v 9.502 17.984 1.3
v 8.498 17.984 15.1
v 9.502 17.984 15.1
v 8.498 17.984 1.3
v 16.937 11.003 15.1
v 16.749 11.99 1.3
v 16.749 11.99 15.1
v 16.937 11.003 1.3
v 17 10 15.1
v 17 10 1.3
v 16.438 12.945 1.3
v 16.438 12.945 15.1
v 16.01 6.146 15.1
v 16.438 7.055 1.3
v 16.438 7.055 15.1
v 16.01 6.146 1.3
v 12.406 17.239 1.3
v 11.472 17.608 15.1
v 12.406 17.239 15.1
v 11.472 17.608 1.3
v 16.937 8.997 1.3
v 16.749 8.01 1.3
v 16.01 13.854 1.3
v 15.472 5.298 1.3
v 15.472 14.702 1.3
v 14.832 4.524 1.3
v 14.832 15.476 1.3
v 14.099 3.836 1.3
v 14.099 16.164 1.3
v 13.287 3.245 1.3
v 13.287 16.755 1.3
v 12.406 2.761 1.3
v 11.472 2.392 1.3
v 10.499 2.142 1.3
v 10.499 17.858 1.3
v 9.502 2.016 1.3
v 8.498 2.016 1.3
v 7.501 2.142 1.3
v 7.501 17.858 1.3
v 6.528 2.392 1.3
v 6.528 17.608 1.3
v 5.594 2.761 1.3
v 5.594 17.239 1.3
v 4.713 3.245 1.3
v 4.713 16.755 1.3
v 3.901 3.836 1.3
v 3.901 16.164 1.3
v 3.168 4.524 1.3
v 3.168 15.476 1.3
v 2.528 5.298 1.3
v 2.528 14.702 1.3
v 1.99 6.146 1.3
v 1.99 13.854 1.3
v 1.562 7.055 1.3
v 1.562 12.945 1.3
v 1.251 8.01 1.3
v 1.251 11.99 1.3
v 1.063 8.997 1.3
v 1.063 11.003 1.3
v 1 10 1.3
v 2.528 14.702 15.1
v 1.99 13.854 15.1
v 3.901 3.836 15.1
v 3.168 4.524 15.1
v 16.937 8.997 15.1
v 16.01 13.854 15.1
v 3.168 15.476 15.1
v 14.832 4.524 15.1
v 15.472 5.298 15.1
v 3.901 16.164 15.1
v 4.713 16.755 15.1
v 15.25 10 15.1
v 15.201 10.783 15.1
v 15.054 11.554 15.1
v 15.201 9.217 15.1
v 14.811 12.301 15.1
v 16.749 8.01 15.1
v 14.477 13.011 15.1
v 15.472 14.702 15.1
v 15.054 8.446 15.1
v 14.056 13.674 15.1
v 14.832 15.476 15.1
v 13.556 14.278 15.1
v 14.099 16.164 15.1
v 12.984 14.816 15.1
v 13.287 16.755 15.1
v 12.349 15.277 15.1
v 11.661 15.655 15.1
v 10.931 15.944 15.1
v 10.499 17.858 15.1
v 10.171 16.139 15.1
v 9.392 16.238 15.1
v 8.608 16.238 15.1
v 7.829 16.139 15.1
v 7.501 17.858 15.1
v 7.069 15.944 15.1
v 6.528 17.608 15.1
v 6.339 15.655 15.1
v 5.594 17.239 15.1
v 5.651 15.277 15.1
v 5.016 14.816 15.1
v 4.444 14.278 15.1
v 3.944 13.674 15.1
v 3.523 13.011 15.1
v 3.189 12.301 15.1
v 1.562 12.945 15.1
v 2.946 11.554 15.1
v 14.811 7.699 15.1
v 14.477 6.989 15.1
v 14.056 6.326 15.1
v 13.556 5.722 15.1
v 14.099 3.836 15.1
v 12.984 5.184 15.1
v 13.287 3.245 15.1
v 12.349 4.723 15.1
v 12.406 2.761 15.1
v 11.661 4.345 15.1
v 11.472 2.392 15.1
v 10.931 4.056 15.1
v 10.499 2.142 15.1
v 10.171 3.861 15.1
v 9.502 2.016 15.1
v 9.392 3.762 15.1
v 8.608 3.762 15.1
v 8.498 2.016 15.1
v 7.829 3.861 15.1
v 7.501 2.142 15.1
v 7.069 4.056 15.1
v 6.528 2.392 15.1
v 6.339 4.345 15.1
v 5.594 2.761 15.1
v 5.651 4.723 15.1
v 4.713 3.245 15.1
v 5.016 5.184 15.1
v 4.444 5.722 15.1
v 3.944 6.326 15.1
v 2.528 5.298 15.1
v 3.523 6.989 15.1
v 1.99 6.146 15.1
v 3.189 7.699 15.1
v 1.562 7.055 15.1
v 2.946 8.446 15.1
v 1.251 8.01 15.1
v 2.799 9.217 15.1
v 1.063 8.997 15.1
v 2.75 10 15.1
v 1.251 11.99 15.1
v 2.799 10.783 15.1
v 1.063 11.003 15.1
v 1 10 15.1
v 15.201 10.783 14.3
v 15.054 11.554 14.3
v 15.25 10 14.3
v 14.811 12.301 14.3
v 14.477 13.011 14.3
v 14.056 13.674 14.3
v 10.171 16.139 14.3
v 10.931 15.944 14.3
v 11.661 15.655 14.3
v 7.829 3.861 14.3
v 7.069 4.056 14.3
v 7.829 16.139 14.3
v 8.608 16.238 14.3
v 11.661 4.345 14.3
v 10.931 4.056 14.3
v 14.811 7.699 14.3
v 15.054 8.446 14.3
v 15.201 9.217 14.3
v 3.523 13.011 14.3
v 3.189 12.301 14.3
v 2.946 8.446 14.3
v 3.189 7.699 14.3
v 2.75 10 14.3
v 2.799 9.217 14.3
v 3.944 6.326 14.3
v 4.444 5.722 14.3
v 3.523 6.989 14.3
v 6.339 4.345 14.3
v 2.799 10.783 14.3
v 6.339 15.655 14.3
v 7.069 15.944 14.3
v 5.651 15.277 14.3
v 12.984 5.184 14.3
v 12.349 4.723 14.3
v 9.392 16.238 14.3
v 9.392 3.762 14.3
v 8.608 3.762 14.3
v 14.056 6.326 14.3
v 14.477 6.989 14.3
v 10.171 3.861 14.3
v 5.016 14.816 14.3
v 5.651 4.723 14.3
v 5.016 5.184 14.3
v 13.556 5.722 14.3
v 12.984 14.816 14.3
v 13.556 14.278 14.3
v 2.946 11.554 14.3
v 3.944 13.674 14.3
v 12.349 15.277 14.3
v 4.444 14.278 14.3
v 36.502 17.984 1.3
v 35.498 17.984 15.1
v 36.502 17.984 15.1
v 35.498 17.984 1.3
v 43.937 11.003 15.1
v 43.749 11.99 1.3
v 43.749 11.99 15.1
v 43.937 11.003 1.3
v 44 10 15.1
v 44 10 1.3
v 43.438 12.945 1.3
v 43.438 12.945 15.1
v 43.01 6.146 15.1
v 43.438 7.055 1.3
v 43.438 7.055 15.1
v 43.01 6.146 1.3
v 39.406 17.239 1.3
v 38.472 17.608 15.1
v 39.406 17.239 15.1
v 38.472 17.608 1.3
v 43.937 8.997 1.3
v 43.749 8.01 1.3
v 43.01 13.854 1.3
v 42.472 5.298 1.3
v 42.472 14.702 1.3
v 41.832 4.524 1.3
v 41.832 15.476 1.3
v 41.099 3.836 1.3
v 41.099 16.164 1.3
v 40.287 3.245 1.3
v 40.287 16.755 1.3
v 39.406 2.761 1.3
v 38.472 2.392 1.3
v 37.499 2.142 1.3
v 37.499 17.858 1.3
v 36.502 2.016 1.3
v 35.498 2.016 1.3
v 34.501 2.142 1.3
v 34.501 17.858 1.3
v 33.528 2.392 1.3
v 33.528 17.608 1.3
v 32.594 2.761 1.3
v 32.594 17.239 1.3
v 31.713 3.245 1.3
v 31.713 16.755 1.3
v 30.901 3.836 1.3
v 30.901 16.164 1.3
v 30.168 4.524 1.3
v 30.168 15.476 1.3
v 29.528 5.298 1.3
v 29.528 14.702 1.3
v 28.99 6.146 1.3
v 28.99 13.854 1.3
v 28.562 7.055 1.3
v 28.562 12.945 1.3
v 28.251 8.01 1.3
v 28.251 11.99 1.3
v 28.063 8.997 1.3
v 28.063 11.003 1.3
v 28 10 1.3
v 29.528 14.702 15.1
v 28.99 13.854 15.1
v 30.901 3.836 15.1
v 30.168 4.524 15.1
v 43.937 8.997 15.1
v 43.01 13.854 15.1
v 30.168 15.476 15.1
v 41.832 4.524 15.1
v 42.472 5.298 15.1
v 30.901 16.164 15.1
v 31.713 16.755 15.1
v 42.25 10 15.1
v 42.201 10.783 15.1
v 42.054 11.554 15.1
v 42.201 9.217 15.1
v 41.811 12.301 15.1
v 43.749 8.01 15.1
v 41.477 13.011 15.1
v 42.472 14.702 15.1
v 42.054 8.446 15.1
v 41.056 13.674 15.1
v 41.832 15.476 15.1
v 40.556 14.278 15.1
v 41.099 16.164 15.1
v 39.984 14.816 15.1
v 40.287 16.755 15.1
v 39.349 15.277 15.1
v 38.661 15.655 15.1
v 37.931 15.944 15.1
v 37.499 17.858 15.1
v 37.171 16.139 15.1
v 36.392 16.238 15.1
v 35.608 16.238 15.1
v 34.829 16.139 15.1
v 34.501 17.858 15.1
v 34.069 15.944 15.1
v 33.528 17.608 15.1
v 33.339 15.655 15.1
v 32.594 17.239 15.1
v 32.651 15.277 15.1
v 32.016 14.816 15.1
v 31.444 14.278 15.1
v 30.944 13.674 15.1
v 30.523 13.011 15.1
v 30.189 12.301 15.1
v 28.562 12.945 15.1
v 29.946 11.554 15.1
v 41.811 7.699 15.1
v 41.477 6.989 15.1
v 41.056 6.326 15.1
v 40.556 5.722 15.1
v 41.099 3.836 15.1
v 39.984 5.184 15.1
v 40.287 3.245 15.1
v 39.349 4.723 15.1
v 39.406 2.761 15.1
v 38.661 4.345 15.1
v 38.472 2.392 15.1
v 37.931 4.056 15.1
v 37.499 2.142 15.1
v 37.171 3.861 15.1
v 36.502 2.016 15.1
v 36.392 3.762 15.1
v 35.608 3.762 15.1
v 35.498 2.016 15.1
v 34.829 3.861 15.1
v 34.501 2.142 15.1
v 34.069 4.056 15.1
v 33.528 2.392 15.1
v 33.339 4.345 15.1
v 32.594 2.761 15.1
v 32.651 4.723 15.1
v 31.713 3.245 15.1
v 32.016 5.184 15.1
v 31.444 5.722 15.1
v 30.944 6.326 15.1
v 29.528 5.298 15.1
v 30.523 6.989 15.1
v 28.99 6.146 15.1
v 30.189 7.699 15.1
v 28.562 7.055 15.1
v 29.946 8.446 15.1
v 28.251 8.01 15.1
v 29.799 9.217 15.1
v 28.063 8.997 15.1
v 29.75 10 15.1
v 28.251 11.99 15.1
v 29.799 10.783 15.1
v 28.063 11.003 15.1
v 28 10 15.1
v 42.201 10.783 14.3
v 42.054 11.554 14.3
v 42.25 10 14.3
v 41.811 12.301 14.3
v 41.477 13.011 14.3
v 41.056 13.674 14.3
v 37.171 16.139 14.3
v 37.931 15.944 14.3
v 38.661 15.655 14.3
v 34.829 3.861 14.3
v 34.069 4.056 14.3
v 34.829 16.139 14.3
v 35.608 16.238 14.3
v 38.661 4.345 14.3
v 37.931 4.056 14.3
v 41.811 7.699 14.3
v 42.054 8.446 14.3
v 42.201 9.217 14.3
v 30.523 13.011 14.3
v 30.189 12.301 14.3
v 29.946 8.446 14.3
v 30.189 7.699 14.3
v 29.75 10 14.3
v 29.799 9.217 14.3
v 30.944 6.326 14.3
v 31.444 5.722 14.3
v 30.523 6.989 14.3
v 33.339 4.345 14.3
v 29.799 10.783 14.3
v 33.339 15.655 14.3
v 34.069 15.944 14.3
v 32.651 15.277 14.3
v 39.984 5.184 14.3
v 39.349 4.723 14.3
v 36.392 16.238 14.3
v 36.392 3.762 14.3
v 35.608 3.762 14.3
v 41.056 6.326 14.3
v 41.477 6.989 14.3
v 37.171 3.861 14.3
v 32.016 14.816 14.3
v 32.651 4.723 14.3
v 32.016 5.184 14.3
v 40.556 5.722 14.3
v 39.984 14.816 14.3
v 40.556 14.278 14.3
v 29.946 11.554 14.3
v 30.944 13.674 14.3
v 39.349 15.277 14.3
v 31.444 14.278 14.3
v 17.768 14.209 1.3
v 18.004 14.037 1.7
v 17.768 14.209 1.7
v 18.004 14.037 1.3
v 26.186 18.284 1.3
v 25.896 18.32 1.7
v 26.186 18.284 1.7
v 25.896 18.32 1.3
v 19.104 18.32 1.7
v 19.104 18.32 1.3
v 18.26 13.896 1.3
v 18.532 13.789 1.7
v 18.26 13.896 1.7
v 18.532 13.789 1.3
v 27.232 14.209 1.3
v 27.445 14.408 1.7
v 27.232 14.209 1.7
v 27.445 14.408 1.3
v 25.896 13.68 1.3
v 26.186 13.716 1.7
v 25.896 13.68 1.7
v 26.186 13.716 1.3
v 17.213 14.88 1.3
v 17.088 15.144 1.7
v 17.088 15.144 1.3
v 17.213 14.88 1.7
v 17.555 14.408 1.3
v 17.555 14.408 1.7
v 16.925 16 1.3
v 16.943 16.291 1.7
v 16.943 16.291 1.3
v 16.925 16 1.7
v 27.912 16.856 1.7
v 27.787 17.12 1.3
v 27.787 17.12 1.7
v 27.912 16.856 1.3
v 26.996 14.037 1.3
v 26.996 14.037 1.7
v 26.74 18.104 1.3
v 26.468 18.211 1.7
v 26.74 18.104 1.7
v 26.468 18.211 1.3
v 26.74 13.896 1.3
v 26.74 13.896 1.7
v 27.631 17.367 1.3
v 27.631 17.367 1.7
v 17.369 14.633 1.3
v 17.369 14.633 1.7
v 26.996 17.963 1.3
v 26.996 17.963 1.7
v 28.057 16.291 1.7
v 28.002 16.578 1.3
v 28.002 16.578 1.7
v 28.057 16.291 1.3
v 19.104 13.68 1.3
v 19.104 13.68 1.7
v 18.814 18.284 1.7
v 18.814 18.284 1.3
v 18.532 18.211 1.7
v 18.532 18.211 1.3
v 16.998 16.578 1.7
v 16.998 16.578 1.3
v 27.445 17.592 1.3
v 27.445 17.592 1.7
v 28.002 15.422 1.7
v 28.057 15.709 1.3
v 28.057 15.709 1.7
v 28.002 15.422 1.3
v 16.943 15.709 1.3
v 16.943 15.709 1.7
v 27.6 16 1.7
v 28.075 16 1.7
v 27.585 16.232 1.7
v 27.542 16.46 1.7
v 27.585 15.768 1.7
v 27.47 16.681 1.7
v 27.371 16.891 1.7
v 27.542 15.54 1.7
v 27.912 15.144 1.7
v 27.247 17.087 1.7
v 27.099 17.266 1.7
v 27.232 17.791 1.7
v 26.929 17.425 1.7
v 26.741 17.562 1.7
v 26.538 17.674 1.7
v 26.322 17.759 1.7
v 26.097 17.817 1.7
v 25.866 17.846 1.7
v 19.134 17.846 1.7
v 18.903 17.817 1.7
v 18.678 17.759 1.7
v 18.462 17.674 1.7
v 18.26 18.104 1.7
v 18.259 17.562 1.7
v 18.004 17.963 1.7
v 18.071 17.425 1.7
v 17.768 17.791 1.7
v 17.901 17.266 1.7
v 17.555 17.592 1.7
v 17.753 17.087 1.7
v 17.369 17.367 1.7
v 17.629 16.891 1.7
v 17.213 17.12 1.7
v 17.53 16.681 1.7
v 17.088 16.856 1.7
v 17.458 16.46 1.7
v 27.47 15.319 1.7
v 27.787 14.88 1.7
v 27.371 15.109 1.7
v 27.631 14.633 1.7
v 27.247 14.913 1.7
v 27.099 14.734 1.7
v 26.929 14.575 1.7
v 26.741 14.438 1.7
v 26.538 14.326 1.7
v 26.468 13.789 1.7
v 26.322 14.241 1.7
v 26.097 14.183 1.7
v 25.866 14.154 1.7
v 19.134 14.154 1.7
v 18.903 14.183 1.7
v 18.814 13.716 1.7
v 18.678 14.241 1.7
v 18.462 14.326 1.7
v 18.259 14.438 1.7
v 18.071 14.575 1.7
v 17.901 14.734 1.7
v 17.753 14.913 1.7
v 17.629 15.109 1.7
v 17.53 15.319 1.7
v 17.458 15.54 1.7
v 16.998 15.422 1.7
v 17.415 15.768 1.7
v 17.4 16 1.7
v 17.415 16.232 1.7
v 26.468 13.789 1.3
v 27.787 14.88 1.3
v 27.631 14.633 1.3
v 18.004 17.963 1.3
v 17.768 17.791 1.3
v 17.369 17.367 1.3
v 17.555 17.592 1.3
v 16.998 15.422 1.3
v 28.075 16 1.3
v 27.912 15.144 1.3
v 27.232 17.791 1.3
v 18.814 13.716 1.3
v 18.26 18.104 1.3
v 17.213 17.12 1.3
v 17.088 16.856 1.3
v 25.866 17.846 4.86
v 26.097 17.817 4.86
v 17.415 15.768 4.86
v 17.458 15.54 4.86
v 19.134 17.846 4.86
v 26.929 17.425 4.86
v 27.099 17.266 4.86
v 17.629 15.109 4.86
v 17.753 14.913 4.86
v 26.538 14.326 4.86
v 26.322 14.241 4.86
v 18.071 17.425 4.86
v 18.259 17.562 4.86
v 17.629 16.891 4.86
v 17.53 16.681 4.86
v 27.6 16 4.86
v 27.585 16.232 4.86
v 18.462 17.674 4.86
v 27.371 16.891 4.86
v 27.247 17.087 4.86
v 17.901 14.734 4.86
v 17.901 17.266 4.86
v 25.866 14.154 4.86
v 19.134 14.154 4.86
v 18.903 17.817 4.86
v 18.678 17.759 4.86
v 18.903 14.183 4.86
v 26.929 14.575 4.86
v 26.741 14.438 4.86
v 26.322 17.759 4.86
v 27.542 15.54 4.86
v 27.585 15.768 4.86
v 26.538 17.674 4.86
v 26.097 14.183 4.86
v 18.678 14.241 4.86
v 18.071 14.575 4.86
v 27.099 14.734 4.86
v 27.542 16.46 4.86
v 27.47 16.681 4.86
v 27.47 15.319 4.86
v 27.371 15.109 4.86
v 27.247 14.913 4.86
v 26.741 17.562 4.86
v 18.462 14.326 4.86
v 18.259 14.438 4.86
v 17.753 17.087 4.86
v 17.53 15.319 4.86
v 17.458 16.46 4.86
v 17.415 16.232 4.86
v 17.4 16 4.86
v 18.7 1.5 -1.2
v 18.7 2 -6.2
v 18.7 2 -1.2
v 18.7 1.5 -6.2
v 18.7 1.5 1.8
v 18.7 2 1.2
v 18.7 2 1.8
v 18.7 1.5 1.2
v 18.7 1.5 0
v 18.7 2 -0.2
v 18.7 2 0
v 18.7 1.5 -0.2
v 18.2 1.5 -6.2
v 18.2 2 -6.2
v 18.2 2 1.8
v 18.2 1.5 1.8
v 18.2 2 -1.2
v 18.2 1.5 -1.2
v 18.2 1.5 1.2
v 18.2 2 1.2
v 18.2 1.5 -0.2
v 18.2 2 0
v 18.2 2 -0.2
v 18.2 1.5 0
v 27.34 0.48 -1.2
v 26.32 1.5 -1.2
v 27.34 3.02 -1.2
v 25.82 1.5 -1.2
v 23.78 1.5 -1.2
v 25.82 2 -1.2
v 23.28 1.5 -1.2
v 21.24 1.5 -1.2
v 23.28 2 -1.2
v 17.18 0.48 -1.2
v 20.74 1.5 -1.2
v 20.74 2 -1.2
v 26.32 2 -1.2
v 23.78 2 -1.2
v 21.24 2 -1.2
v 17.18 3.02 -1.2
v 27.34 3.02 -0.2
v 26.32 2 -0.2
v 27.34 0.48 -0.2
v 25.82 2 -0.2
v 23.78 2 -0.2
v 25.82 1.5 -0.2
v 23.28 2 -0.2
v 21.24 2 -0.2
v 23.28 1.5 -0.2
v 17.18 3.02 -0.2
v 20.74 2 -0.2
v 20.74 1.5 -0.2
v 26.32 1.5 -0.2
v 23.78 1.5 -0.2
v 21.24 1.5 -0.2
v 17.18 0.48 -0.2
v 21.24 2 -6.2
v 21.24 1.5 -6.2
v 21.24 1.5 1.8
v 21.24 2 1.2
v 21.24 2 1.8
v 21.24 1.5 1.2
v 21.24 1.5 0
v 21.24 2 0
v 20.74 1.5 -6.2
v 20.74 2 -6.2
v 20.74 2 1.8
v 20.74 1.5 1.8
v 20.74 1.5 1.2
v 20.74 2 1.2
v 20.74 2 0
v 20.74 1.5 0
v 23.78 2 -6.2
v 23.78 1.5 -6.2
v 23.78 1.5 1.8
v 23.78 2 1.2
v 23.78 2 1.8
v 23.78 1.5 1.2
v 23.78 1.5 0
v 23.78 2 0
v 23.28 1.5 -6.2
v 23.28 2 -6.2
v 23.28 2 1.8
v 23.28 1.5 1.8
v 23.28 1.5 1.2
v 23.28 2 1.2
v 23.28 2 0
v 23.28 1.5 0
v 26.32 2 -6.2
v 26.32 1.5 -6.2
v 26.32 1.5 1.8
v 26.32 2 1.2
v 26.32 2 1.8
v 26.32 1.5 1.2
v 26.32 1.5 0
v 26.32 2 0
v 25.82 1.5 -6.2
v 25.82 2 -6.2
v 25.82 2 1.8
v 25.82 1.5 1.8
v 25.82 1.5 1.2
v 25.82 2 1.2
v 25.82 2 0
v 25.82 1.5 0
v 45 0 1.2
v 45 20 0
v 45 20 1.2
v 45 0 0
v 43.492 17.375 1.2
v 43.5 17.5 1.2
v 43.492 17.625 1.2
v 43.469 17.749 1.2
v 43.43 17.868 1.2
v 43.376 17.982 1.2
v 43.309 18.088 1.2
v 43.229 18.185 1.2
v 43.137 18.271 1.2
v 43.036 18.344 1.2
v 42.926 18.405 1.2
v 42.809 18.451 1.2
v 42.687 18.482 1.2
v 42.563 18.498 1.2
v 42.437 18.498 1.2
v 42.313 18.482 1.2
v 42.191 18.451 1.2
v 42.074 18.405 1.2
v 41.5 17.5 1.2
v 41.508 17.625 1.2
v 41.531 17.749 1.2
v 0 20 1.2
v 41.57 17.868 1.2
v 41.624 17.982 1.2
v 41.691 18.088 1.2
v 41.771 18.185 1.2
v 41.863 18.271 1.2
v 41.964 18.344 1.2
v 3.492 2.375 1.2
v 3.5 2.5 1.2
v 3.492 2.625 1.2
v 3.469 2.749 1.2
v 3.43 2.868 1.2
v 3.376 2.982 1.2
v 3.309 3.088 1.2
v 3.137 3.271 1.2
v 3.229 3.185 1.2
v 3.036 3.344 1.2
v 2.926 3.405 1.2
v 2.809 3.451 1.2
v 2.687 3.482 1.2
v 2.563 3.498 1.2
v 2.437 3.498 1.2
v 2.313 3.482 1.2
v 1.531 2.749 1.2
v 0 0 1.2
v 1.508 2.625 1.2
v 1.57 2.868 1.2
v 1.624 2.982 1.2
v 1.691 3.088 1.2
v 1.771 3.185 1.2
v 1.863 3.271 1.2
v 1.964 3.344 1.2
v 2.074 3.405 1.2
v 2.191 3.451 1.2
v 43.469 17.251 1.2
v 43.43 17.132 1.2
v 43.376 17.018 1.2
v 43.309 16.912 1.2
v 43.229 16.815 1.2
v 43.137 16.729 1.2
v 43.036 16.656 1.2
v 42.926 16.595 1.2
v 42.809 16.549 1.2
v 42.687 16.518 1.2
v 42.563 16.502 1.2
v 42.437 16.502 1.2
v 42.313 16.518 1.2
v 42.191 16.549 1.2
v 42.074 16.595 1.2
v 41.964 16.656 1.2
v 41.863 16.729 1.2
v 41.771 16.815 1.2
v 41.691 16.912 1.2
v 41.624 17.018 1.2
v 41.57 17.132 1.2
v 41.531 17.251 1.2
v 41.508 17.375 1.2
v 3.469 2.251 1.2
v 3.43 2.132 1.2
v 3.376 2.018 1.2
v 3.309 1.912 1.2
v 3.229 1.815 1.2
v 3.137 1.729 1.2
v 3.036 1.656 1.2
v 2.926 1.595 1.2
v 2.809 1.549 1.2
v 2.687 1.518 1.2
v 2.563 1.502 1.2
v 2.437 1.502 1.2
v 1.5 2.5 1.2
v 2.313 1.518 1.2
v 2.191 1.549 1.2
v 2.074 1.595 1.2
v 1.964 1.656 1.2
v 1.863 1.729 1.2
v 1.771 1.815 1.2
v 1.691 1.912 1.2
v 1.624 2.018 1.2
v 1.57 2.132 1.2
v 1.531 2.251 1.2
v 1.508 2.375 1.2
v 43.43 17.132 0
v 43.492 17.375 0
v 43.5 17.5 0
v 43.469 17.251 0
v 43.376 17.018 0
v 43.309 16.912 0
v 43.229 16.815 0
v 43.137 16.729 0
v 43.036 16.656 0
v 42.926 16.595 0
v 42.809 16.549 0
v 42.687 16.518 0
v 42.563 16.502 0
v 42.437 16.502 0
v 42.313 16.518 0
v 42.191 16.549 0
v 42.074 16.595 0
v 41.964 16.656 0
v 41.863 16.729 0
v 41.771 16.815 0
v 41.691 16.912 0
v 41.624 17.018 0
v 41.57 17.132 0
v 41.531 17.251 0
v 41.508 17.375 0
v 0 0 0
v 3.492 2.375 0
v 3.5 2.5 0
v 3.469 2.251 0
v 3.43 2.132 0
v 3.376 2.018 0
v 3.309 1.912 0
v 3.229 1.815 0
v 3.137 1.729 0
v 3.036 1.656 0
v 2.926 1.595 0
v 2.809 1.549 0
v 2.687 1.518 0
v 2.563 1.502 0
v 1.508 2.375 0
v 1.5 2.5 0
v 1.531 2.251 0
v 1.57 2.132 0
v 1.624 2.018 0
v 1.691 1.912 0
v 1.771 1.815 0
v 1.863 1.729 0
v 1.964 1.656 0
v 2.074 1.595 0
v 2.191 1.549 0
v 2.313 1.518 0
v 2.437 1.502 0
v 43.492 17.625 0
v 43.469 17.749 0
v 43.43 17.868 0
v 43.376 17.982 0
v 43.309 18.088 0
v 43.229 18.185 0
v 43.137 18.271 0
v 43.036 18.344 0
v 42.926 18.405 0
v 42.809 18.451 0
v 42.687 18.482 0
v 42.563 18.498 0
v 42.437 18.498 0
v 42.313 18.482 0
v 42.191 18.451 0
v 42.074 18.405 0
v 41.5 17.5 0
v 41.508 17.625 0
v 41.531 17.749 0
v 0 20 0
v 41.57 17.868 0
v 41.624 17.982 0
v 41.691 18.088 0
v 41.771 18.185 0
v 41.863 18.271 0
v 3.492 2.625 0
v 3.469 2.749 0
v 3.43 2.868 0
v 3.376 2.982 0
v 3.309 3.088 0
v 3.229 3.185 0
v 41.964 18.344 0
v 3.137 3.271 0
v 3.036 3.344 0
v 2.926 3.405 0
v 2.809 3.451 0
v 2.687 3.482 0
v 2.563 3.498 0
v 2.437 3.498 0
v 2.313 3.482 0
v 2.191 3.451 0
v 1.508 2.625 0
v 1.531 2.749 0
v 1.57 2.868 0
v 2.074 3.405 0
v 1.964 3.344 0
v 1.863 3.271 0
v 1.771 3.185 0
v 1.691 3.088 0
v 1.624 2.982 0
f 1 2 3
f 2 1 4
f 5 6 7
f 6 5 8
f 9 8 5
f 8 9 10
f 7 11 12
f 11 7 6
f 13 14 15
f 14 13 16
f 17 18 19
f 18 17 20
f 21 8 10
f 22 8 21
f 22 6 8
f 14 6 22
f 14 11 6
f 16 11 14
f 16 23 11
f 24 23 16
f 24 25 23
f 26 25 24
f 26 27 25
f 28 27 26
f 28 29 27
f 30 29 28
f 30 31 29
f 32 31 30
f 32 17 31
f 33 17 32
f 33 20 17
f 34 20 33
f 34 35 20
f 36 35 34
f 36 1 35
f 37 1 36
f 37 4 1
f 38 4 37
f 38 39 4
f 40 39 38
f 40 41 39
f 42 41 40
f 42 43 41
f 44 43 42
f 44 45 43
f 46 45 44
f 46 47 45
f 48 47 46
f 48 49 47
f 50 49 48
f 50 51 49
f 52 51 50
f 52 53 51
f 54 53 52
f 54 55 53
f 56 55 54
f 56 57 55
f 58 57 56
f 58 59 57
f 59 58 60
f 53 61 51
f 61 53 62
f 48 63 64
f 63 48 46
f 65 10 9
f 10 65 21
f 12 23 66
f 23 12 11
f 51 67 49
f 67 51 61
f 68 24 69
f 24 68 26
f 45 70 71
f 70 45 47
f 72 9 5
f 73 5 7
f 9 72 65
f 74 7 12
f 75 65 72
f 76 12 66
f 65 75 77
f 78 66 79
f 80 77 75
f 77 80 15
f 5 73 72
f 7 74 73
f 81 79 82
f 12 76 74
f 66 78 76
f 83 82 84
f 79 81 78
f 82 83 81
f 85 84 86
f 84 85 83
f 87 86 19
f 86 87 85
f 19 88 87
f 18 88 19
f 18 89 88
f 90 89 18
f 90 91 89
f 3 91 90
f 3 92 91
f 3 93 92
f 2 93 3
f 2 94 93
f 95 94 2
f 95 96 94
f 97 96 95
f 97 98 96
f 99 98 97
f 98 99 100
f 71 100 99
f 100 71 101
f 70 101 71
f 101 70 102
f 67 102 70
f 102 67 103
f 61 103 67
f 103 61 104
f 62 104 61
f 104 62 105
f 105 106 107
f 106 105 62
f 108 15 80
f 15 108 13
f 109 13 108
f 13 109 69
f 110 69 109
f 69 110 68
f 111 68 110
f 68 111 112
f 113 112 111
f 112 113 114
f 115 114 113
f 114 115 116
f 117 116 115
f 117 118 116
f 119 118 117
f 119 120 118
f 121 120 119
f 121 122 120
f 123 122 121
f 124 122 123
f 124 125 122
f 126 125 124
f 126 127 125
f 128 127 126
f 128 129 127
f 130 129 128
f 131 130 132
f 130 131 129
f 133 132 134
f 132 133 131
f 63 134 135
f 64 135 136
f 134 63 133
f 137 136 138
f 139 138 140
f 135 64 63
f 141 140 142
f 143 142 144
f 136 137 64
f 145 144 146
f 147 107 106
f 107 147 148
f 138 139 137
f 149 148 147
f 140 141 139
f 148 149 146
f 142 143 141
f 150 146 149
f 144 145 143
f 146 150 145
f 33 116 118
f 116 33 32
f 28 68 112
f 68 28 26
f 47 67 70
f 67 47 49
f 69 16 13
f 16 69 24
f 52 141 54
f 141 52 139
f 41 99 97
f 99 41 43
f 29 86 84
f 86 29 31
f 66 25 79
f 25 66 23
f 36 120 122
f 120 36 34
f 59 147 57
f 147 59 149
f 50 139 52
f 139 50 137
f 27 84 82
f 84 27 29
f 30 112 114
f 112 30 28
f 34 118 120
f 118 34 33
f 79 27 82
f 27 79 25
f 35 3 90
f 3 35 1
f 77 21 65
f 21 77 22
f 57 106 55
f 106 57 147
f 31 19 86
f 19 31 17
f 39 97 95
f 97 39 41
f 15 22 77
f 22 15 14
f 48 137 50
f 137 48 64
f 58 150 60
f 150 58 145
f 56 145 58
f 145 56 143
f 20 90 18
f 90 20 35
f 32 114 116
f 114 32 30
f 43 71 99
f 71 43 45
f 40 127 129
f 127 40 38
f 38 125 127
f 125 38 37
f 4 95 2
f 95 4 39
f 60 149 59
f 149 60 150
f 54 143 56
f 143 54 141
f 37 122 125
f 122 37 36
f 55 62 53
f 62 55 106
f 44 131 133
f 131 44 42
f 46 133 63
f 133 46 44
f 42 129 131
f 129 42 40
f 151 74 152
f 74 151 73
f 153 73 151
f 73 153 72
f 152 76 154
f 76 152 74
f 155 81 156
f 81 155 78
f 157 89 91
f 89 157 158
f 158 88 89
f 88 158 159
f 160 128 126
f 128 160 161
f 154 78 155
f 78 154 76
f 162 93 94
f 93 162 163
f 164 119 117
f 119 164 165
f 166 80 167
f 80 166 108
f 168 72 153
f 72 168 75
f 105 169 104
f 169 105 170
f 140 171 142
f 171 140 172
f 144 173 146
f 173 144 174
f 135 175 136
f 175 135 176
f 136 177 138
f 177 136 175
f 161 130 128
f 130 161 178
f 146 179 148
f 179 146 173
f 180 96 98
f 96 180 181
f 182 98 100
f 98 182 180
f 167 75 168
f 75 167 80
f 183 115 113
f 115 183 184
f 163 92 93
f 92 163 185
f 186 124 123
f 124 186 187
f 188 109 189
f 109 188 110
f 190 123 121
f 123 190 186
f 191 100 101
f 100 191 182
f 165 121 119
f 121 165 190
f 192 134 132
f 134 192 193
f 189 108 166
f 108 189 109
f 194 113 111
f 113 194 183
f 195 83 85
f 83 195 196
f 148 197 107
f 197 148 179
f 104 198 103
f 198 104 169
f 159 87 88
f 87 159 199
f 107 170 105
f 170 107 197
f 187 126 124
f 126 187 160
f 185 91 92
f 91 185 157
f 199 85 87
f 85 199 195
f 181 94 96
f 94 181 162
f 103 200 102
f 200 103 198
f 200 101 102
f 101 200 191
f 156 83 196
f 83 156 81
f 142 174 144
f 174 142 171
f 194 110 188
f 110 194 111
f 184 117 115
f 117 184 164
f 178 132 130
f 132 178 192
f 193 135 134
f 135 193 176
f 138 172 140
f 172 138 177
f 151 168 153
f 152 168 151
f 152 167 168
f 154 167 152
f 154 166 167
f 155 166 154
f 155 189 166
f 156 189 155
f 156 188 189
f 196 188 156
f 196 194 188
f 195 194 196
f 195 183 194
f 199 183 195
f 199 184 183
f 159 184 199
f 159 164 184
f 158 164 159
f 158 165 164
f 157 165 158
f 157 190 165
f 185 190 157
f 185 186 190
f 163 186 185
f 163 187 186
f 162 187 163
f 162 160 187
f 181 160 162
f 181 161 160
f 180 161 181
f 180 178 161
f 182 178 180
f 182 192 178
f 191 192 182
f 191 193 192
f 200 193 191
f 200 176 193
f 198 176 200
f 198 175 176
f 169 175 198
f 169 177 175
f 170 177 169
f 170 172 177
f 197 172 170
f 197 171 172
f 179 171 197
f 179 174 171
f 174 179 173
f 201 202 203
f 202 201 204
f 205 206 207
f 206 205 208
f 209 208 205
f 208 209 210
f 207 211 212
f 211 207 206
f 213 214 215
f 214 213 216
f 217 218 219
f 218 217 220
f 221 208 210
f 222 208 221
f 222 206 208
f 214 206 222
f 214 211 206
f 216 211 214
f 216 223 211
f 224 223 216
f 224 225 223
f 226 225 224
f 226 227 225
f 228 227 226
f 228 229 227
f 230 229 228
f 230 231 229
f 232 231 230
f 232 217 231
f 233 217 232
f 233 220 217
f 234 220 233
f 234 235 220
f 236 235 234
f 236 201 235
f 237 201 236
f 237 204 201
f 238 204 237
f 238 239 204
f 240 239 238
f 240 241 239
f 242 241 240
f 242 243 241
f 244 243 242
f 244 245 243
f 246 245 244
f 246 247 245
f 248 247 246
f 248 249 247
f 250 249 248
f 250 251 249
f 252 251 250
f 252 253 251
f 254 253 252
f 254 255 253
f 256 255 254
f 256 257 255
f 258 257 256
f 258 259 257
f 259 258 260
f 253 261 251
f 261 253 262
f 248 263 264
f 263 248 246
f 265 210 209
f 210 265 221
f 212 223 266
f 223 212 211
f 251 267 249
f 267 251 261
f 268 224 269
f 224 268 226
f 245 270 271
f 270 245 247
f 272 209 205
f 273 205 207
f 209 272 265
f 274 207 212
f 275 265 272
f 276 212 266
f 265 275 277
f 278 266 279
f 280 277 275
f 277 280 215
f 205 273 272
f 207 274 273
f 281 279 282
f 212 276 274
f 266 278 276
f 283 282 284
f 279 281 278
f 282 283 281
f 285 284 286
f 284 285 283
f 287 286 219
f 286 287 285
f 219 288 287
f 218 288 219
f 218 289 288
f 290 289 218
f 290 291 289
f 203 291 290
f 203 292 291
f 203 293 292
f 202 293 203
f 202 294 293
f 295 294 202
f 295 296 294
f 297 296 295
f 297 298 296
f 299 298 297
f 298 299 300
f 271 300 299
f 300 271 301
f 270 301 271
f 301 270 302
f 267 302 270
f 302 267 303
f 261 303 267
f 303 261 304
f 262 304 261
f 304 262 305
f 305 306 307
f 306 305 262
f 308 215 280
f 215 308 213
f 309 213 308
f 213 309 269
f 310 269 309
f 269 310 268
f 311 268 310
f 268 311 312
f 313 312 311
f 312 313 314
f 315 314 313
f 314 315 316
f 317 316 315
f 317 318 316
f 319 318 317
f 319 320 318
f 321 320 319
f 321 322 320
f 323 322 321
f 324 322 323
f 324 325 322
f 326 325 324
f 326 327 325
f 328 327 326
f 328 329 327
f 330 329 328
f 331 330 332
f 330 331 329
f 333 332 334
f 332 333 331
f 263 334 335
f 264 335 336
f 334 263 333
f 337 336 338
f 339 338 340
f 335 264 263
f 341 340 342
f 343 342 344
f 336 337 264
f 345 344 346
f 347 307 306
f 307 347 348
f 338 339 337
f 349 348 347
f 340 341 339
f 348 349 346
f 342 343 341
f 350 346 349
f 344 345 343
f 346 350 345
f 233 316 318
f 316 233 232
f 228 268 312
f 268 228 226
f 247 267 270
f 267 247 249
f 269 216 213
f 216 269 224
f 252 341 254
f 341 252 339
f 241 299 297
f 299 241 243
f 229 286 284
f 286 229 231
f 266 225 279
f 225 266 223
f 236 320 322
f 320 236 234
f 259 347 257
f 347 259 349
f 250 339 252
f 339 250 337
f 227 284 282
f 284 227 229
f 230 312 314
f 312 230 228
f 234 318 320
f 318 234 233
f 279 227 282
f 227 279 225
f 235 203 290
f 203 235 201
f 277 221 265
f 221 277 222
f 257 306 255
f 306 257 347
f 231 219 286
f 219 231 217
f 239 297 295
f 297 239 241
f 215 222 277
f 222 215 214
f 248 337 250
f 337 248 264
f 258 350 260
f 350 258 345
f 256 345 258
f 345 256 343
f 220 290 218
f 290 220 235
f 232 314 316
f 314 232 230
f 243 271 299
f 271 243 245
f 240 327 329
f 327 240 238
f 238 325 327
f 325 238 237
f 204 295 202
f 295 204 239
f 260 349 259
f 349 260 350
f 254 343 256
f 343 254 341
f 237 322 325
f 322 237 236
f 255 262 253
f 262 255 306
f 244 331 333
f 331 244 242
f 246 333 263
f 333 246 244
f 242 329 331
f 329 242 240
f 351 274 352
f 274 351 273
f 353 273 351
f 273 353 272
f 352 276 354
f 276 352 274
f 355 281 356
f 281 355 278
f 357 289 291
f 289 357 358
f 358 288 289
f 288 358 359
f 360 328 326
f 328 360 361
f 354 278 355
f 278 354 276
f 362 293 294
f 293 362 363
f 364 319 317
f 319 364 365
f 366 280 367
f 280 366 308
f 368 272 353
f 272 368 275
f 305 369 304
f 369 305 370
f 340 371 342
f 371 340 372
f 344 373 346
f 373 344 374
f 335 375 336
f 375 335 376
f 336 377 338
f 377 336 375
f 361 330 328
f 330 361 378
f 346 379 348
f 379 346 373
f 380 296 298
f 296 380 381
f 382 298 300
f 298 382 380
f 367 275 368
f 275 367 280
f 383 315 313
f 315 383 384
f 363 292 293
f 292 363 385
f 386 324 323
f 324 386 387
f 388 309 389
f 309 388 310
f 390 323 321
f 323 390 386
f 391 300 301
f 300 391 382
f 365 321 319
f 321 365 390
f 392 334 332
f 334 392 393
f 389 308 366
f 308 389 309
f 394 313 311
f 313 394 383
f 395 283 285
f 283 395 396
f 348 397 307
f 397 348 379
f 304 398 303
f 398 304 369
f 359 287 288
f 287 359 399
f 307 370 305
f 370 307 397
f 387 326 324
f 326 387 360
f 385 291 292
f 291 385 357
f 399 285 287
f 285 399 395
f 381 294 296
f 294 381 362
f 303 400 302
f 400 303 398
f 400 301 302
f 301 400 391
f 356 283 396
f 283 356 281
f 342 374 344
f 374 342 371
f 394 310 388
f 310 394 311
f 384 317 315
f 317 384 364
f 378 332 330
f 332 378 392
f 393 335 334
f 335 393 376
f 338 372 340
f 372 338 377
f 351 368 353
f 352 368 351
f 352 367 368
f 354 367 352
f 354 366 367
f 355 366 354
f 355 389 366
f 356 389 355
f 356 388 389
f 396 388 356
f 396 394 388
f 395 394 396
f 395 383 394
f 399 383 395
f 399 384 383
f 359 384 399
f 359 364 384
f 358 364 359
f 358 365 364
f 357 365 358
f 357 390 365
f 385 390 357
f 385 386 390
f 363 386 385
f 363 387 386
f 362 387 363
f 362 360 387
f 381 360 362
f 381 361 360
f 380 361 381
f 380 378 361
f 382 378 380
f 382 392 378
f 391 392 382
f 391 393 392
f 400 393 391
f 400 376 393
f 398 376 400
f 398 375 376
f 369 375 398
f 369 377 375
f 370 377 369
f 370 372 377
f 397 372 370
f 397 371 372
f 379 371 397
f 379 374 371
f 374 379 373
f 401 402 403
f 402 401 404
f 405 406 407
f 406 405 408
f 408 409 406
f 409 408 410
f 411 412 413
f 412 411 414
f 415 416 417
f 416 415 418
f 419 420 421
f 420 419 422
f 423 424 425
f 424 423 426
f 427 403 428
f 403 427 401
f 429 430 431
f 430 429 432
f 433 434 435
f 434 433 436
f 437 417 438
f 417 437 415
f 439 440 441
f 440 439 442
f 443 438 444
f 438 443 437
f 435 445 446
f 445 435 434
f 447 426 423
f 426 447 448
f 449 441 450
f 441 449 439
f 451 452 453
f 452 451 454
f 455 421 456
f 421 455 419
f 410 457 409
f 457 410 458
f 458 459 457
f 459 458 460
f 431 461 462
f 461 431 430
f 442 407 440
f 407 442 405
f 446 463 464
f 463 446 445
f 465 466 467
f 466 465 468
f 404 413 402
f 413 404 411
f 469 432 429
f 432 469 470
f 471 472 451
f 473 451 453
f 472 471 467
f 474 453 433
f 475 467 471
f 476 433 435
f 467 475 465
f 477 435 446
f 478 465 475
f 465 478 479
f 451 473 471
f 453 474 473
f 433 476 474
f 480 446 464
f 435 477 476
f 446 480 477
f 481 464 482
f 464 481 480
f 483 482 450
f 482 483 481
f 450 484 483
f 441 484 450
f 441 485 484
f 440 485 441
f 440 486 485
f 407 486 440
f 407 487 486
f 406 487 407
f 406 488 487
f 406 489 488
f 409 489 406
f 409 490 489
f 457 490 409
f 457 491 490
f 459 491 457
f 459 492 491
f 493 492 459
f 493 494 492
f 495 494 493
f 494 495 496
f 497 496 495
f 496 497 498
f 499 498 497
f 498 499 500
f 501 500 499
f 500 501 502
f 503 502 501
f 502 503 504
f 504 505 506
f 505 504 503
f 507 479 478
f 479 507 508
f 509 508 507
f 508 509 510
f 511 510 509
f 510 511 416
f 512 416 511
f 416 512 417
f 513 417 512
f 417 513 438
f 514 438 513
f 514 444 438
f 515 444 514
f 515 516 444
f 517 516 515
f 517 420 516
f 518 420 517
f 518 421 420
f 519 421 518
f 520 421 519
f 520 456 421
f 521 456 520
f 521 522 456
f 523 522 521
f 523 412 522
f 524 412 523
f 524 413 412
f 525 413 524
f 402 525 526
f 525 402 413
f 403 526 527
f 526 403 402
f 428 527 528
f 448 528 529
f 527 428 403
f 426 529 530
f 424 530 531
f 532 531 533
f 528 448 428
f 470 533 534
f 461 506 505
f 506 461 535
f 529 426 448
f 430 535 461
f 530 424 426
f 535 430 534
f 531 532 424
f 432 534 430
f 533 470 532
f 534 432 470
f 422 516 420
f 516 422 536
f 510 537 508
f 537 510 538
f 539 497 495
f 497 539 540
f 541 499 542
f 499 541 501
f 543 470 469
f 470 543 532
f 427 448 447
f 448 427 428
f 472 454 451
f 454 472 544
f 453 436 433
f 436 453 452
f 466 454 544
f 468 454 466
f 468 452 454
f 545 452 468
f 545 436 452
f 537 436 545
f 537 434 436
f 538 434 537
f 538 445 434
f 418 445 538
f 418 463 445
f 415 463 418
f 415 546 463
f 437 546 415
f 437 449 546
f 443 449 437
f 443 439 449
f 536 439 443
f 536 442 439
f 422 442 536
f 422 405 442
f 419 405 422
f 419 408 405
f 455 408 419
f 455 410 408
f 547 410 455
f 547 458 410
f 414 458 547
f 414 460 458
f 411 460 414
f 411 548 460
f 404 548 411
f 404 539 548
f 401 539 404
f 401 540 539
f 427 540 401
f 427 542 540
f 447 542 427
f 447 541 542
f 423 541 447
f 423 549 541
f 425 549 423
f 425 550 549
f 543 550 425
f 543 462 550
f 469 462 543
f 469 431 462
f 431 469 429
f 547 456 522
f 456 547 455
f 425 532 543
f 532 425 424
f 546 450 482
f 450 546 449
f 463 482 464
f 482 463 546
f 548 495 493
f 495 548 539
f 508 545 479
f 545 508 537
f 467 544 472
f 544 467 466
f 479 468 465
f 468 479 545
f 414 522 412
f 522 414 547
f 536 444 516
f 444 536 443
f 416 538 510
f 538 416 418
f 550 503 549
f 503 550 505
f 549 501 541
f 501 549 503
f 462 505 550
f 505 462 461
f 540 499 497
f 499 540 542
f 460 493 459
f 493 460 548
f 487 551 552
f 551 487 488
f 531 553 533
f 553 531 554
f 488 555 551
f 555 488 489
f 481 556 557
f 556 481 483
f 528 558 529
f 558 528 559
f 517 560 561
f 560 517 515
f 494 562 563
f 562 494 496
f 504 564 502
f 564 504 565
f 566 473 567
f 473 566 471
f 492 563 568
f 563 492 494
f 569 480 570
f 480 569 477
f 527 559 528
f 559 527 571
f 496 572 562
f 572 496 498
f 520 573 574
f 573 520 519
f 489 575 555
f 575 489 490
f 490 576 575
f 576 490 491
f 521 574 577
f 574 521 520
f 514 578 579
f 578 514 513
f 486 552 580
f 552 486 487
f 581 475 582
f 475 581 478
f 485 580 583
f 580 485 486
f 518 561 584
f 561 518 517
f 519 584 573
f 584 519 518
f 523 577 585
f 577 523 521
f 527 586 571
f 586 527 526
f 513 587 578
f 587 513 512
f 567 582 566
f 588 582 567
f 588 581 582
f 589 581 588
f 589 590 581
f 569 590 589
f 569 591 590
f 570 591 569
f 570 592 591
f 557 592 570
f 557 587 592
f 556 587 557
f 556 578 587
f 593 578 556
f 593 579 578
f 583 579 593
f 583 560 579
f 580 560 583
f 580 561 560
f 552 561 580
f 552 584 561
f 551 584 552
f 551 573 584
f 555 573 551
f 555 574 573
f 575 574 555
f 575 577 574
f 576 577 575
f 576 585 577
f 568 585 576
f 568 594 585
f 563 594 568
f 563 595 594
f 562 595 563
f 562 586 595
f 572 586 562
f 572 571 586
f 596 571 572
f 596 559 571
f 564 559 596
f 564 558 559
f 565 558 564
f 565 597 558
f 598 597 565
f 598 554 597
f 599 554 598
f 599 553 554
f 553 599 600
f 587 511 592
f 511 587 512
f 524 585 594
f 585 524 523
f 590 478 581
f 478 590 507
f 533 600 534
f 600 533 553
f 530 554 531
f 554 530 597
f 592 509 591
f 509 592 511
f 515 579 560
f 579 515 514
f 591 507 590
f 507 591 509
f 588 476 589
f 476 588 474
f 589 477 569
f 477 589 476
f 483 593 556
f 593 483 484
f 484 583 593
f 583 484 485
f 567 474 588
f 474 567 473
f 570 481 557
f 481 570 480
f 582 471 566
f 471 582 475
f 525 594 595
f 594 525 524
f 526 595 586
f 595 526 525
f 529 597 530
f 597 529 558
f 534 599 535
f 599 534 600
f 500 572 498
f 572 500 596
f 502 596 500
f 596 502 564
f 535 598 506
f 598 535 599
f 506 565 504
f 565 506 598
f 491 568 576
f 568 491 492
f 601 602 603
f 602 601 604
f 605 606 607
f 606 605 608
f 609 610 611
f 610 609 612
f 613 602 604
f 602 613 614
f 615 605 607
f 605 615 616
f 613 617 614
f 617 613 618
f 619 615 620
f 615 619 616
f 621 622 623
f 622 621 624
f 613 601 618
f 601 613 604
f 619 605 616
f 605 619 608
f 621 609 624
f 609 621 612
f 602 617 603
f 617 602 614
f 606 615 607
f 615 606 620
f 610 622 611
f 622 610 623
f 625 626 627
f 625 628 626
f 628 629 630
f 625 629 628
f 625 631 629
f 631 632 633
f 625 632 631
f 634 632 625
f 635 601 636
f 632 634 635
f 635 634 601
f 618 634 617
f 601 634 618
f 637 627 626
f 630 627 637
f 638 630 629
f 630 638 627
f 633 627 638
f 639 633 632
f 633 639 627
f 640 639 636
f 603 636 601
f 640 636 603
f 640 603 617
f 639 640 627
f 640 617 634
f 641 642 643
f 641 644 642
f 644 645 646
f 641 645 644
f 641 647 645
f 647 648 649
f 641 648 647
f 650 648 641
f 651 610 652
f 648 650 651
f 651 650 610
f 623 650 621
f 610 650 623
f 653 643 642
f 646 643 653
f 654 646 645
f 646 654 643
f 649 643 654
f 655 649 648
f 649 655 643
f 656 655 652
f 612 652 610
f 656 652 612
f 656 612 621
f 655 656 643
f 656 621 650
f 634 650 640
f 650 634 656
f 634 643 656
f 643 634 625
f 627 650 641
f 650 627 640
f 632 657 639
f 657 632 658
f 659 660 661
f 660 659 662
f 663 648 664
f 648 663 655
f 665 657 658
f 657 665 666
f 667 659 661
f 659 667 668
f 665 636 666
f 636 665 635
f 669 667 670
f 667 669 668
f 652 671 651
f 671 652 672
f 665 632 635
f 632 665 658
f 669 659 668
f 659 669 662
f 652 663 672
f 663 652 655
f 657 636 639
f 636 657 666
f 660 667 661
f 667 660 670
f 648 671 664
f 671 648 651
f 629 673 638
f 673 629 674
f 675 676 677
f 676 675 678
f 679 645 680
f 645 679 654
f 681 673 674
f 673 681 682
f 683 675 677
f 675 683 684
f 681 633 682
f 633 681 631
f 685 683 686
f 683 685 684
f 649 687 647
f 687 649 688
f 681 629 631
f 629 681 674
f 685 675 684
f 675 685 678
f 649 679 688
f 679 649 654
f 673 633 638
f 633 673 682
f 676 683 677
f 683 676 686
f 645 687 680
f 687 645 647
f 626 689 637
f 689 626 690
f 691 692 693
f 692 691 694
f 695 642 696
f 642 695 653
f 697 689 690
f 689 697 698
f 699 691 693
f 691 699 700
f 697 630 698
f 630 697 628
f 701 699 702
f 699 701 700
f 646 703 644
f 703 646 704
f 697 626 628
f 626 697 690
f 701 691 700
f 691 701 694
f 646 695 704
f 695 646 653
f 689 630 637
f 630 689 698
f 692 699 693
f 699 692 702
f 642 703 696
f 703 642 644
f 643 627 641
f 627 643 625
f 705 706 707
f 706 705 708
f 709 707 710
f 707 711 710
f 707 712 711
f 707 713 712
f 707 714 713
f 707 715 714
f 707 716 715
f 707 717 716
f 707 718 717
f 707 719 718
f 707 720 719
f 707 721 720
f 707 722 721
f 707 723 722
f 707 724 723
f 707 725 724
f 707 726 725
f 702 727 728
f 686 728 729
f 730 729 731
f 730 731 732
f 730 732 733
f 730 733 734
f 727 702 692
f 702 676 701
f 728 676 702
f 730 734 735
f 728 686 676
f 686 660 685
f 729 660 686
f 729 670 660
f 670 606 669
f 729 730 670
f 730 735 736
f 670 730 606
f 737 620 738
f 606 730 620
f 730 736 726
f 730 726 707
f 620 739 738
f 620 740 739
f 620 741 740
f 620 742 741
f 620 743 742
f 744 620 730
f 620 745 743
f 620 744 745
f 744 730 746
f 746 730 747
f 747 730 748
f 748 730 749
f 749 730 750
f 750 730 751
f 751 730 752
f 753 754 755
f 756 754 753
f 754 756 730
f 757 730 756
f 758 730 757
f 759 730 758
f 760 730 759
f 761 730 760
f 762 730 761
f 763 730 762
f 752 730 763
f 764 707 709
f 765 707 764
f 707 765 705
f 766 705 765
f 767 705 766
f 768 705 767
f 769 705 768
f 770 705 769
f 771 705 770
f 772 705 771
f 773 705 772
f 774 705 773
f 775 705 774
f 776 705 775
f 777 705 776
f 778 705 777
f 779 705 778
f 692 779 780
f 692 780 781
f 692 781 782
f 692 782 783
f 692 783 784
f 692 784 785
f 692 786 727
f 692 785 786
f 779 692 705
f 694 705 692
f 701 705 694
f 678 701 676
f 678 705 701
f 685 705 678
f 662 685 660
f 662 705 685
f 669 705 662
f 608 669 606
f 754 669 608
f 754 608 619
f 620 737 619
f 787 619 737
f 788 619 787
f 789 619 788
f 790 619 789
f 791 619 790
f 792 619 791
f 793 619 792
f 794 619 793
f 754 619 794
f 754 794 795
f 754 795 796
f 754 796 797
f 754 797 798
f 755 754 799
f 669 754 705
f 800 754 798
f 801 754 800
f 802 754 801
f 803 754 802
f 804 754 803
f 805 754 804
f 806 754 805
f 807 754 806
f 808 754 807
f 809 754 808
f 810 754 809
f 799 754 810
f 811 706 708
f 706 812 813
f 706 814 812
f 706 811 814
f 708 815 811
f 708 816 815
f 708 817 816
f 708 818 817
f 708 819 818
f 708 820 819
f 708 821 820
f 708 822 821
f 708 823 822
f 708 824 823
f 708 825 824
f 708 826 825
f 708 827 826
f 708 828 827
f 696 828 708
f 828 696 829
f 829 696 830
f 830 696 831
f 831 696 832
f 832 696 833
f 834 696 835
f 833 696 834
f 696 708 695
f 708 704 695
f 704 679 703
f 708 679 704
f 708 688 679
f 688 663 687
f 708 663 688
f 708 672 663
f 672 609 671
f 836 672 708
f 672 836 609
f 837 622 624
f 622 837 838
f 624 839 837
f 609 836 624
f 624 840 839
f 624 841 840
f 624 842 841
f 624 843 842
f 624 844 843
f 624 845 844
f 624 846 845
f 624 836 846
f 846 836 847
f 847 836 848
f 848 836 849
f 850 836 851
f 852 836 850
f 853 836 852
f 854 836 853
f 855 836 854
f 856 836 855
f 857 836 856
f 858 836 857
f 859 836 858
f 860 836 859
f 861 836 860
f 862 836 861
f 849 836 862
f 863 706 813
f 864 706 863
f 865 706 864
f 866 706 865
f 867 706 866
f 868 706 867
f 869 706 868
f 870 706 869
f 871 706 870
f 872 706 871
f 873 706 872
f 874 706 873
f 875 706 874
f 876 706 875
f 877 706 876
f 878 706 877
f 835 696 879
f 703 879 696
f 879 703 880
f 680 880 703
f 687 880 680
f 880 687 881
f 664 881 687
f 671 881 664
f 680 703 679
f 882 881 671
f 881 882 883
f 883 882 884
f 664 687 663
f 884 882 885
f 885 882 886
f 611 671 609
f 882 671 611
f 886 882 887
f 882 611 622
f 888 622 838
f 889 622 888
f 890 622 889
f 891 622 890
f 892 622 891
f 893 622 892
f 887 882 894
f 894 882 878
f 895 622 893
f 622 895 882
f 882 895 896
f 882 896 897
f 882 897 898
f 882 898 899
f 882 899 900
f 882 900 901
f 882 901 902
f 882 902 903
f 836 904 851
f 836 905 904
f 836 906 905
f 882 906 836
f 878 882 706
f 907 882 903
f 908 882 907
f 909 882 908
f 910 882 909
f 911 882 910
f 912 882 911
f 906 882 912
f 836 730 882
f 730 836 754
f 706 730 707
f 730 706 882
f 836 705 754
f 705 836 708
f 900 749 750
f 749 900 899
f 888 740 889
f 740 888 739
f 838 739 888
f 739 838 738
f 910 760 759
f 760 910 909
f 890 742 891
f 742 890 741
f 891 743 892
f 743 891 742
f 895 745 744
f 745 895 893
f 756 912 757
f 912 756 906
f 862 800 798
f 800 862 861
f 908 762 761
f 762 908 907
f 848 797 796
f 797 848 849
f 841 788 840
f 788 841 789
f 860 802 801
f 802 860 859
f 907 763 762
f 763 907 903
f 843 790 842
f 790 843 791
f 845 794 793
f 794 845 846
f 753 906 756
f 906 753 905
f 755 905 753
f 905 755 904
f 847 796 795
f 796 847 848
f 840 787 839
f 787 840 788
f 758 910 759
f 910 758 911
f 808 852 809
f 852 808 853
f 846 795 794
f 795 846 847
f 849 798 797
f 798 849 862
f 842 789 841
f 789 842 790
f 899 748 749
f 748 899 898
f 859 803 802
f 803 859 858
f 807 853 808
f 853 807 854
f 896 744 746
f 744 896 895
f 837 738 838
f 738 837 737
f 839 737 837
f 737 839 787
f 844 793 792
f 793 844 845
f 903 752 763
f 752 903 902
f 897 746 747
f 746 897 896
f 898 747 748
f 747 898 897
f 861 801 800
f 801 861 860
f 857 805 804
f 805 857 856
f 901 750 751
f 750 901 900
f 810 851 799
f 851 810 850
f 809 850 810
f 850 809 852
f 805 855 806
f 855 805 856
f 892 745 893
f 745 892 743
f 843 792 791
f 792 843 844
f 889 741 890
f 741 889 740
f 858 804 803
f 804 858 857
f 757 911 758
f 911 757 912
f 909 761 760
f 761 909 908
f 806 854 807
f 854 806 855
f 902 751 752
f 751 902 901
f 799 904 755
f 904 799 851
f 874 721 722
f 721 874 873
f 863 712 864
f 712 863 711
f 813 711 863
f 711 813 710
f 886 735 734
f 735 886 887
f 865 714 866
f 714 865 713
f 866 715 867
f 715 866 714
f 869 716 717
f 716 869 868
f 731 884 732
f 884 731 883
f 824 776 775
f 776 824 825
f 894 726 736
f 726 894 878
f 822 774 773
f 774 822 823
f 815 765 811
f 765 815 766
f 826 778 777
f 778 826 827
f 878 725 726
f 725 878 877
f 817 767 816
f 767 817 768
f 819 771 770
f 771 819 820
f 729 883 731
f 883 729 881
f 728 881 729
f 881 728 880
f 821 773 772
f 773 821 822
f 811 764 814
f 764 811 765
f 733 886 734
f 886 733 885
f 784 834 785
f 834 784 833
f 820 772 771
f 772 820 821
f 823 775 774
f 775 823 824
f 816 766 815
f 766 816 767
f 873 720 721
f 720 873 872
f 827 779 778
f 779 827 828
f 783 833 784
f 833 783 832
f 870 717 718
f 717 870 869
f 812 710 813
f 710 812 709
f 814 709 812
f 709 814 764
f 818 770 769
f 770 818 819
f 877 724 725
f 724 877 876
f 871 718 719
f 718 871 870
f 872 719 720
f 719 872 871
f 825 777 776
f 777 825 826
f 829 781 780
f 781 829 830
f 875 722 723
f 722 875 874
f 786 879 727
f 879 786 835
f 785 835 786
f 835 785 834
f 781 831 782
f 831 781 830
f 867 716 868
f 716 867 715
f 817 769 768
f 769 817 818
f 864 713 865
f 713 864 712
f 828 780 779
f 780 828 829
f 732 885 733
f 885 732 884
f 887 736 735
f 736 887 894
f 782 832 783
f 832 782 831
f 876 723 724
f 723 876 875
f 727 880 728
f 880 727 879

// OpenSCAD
//HC-SR04 Ultrasonic distance sensor module

//Mark Benson

//23/07/2013

//Creative Commons non commercial

difference()
{
	union()
	{
		color("DARKBLUE")cube([45,20,1.2]);
		translate([16/2+1,18/2+1,1.3]) ultrasonicSensor();
		translate([16/2+27+1,18/2+1,1.3]) ultrasonicSensor();
		color("SILVER")translate([45/2-3.25,20-4,1.3]) xtal();
		translate([(45/2)-((2.45*4)/2)+0.6,2,-0.2]) rotate([180,0,0]) headerPin(4);
	}

	union()
	{
		color("DARKBLUE") translate([2.5,2.5,-1]) cylinder(r=2/2, h=3, $fn=50);
		color("DARKBLUE") translate([2.5+40,2.5+15,-1]) cylinder(r=2/2, h=3, $fn=50);
	}
}

module ultrasonicSensor()
{
	union()
	{
		//Sensor body
		color("SILVER")
		difference()
		{
			//Body
			translate([0,0,0]) cylinder(r=16/2, h=13.8, $fn=50);
			//Hole in body
			translate([0,0,0]) cylinder(r=12.5/2, h=14, $fn=50);
		}

		//Insert to indicate mesh
		color("GREY") translate([0,0,0]) cylinder(r=12.5/2, h=13, $fn=50);
	}
}

//ultrasonicSensor(); 

module xtal()
{
	//Xtal maximum dimensions for checking model
	//color("red")translate([0,0,-1]) cube([11.5,4.65,1]);
	//color("red")translate([(11.54-10.3)/2,(4.65-3.8)/2,0]) cube([10.3,3.8,3.56]);
	
	union()
	{
		//Base
		hull()
		{
			translate([0,0,0]) cylinder(r=4.65/2, h=0.4, $fn=50);
			translate([6.5,0,0]) cylinder(r=4.65/2, h=0.4, $fn=50);
		}
	
		//Body
		hull()
		{
			translate([0,0,0]) cylinder(r=3.7/2, h=3.56, $fn=50);
			translate([6.5,0,0]) cylinder(r=3.7/2, h=3.56, $fn=50);
		}
	}
}

module headerPin(numberOfPins)
{
	for (i = [0:numberOfPins-1])
	{
		color("GOLD") translate([(i*2.54),0,-2]) cube([0.5,0.5,8]);
		color("BLACK") translate([(i*2.54-2.54/2+0.25),-2.54/2+0.25,0]) cube([2.54,2.54,1]);
	}
}

headerPin();
